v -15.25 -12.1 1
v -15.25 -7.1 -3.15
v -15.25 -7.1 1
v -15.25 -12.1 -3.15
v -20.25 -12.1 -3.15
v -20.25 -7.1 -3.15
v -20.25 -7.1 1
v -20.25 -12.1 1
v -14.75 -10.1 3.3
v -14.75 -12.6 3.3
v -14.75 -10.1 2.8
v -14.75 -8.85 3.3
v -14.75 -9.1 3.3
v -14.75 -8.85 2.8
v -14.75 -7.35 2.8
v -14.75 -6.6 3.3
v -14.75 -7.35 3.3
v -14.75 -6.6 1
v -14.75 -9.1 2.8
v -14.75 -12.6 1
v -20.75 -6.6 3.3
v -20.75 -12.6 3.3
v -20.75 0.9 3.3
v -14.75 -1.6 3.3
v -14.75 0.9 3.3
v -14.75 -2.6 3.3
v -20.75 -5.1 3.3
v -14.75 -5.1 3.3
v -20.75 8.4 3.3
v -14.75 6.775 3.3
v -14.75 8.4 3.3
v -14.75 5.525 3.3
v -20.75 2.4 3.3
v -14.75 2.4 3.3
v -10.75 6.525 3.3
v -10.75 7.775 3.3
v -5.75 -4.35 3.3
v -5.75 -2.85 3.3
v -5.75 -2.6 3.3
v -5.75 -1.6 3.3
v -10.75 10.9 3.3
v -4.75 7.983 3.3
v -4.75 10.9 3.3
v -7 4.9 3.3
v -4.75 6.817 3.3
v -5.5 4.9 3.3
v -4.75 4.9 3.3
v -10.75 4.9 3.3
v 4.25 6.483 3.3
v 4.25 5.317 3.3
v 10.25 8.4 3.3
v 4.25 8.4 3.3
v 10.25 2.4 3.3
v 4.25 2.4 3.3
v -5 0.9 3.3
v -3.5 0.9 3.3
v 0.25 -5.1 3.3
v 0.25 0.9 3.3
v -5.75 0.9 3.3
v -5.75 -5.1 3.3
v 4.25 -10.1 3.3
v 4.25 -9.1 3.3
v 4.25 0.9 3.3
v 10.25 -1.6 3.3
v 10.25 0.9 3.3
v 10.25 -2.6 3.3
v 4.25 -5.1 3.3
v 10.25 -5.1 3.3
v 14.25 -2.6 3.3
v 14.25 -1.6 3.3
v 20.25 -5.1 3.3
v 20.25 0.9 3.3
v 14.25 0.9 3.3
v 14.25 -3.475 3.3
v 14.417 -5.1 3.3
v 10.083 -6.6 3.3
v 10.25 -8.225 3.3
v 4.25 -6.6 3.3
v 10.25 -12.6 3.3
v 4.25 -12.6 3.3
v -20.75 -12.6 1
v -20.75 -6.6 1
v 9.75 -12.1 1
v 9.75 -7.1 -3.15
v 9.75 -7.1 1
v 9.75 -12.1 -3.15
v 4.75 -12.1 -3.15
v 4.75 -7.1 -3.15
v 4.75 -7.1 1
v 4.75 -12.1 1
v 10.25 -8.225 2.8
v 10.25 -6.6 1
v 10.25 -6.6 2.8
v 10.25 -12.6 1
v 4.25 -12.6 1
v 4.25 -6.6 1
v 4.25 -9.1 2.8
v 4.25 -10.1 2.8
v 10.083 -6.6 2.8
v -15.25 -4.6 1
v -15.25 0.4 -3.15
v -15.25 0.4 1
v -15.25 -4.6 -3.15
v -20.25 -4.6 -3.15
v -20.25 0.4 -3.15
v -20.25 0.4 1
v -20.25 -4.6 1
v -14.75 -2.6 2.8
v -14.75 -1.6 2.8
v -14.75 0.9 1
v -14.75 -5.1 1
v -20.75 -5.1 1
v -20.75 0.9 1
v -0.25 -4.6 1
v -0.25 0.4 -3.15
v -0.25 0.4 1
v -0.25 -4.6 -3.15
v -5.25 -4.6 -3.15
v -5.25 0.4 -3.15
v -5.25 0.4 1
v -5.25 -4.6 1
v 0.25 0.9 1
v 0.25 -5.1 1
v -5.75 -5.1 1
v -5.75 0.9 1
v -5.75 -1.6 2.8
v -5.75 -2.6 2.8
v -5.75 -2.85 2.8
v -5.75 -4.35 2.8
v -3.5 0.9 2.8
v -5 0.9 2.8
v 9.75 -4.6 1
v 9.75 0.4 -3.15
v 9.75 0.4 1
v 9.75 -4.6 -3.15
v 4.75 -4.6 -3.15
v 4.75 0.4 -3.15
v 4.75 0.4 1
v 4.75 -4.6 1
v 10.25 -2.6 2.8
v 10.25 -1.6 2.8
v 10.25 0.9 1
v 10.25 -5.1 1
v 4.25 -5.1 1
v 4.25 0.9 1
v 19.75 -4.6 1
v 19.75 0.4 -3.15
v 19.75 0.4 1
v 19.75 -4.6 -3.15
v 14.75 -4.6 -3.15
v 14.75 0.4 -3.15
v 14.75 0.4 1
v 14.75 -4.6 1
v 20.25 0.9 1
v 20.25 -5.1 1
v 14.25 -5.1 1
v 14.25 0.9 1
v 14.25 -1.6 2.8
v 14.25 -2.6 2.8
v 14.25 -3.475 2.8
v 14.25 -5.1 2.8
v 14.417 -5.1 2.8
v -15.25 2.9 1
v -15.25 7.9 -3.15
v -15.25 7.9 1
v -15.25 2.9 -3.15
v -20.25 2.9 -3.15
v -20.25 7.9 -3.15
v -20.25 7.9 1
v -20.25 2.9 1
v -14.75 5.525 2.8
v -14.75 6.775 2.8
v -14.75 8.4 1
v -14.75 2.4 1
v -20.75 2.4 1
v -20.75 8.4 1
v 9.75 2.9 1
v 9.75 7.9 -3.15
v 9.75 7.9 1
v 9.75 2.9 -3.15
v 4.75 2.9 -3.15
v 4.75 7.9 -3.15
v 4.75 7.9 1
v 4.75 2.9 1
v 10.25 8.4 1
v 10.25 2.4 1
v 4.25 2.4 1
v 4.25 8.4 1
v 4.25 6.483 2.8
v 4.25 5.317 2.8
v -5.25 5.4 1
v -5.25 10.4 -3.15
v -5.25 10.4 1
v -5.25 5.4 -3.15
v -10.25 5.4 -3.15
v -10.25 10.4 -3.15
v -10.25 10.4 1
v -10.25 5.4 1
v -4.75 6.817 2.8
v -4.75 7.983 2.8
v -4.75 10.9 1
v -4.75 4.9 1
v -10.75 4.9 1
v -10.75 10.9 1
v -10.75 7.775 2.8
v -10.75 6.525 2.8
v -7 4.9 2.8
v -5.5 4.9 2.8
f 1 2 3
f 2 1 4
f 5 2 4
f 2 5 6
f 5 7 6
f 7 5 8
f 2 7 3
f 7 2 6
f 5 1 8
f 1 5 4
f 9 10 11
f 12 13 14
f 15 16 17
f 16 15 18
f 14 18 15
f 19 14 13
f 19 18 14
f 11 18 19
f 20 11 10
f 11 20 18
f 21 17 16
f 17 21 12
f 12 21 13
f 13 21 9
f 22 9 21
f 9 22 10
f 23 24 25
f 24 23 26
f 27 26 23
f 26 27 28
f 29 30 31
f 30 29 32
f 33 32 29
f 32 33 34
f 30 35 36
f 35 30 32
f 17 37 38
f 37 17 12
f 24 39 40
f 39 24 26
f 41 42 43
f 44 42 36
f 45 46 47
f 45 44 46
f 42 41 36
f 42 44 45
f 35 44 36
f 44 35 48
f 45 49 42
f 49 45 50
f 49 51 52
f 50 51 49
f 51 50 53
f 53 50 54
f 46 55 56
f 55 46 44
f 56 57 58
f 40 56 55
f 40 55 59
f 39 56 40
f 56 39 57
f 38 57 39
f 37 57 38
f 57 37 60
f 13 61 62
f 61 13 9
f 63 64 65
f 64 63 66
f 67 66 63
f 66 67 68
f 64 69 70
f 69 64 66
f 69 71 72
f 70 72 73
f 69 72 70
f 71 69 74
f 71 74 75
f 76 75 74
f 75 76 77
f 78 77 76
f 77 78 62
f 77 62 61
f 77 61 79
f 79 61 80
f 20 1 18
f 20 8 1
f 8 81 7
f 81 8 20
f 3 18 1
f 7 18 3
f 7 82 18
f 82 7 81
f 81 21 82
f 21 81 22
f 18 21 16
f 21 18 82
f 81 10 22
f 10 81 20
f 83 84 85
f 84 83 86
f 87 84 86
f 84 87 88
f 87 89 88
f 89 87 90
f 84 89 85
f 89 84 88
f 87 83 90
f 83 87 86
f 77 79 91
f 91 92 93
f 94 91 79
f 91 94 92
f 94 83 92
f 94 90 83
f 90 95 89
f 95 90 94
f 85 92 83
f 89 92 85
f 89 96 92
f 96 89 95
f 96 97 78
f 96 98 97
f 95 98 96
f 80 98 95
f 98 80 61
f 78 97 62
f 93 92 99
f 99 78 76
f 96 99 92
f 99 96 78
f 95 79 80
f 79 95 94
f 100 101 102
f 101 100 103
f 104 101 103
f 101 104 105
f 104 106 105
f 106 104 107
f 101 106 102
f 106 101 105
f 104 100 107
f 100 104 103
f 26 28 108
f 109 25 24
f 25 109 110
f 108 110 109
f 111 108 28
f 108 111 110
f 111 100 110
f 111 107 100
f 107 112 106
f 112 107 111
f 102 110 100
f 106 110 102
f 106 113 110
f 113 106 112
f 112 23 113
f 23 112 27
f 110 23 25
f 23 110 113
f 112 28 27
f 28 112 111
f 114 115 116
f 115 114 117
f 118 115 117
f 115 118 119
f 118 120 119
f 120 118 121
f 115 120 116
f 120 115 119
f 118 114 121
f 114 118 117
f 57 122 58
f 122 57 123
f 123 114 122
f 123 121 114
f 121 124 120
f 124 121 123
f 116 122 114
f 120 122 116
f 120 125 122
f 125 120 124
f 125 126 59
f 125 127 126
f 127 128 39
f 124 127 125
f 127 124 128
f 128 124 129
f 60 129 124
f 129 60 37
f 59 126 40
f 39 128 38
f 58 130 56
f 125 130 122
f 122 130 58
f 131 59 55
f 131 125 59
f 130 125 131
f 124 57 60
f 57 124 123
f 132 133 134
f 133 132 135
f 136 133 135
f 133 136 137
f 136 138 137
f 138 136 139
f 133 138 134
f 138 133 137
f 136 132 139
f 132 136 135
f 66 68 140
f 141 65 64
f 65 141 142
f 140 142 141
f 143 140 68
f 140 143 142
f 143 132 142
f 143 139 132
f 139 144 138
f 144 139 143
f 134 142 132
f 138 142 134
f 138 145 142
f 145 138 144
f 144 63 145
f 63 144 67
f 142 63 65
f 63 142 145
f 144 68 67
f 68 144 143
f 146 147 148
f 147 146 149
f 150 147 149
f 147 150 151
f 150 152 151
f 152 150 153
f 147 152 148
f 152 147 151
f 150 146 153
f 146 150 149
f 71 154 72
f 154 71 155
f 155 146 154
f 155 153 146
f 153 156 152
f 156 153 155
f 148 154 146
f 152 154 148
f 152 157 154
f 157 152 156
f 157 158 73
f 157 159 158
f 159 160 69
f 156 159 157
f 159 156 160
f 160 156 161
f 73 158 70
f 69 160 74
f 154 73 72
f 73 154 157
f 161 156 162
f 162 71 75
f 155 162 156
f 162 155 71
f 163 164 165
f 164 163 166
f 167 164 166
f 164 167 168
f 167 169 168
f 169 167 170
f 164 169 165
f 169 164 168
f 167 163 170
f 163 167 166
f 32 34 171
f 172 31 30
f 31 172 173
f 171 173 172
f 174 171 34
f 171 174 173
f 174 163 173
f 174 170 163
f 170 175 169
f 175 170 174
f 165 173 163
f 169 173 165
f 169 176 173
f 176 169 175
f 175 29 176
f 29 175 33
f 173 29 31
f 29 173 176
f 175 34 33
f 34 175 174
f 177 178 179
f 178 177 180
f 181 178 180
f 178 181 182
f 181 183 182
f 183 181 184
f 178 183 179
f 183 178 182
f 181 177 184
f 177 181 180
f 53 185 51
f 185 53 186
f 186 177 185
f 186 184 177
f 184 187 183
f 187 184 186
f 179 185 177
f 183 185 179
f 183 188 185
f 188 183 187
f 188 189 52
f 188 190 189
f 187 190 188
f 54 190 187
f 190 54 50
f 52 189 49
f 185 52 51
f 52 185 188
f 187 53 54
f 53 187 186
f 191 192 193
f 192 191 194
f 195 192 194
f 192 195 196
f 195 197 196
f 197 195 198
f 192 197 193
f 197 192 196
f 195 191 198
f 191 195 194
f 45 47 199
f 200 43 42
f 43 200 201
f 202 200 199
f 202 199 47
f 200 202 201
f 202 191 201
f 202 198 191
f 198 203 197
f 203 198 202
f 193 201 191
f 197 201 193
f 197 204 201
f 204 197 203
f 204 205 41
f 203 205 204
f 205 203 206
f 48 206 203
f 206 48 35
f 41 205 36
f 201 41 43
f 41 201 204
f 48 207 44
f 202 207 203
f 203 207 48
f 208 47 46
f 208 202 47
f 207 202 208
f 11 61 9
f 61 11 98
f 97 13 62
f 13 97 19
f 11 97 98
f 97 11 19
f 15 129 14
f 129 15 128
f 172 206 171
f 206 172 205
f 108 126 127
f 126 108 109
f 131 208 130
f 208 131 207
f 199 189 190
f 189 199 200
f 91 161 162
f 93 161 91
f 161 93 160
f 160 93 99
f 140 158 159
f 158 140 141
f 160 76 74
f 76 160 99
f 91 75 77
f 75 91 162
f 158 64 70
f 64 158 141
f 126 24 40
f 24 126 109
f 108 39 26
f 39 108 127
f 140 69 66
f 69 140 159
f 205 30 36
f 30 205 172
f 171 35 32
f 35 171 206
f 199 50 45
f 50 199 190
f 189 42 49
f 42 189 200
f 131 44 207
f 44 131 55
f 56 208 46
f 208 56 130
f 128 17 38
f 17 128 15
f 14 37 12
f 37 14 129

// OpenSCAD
$fn=30;

hole_d = 2.8;
hole_d_through = 3.5;
wall = 2;
gap = 0.3;
pcb_hole_dist = 2.5;
pcb_double_sz_z = 1.5;
btn_sz_x = pcb_hole_dist * 3;
btn_sz_y = pcb_hole_dist * 2;
btn_sz_z = 5.2;
btn_pressed_sz_z = 4;
inter_btn_space = pcb_hole_dist;
btn_space_z = btn_sz_z + 2*wall;
presser_above_wall = 2;
button_link_sz_z = 0.5;

module button_presser() {
		cube([5, 5, gap+2*wall+presser_above_wall], center=true);
		translate([0, 0, (gap+wall+presser_above_wall)/2]) {
			cube([6, 6, gap+wall], center=true);
		}
}

module button_presser_hole() {
	cube([5+2*gap, 5+2*gap, wall], center=true);
}

// map of button center coordinates in pcb holes from left top corner
// zero based
module button_set(btn_coordinates=[], button_presser_mode=false, btn_links=[]) {
	translate([pcb_hole_off_x-pcb_sz_x/2, pcb_hole_off_y-pcb_sz_y/2, 0]) {
		for(i=[0:len(btn_coordinates)-1]) {
			p = btn_coordinates[i];
			translate([pcb_hole_dist*p[0], pcb_hole_dist*p[1], 0]) {
				if(button_presser_mode) {
					button_presser();
				} else {
					button_presser_hole();
				}
			}
		}
		if(button_presser_mode) {
			for(lnk=btn_links) {
				translate([0, 0, (2*gap+2*wall+presser_above_wall-button_link_sz_z)/2]) {
					hull() {
						p1 = btn_coordinates[lnk[0]];
						p2 = btn_coordinates[lnk[1]];
						translate([pcb_hole_dist*p1[0], pcb_hole_dist*p1[1], 0]) {
							cube([1, 1, button_link_sz_z], center=true);
							translate([pcb_hole_dist*(p2[0]-p1[0]), pcb_hole_dist*(p2[1]-p1[1]), 0]) {
								cube([1, 1, button_link_sz_z], center=true);
							}
						}
					}
				}
			}
		}
	}
}

button_set1 = [
				[1.5, 1],          [11.5, 1],
				[1.5, 4], [7.5, 4], [11.5, 4], [15.5, 4],
				[1.5, 7],          [11.5, 7],
					   [5.5, 8],
];

btn_links1 = [
	[0, 1], [1, 5],
	[2, 3], [4, 5],
	[6, 8], [8, 7],
  [3, 8], [0, 3],
];

pcb_sz_x = 50;
pcb_sz_y = 36.2;
pcb_hole_off_x = 3.5;
pcb_hole_off_y = 6;
pcb_side_free_space = 3;
side_gap = 5;
button_top_sz_x = pcb_sz_x+2*side_gap+2*gap+wall;
button_top_sz_y = pcb_sz_y+2*side_gap+2*gap+wall;
button_top_sz_z = wall+btn_space_z + pcb_double_sz_z;

module buttons_case() {
	difference() {
		union() {
			cube([button_top_sz_x, button_top_sz_y, wall], center=true);
			for(xsgn=[-1, 1]) {
				translate([xsgn*(button_top_sz_x-wall)/2, 0, (button_top_sz_z-wall)/2]) {
					cube([wall, button_top_sz_y, button_top_sz_z], center=true);
				}
			}
			for(ysgn=[-1, 1]) {
				translate([0, ysgn*(button_top_sz_y-wall)/2, (button_top_sz_z-wall)/2]) {
					cube([button_top_sz_x, wall, button_top_sz_z], center=true);
					// corners
					for(xsgn=[-1,1]) {
						translate([xsgn*(button_top_sz_x-wall-side_gap)/2, ysgn*-side_gap/2, 0]) {
							translate([0, ysgn*-wall, 0]) {
								cube([side_gap, side_gap+wall, button_top_sz_z], center=true);
							}
							translate([xsgn*-wall, 0, 0]) {
								cube([side_gap+wall, side_gap, button_top_sz_z], center=true);
							}
							hull() {
								cube([side_gap, side_gap, btn_space_z], center=true);
								translate([xsgn*(-side_gap-pcb_side_free_space)/2, ysgn*(-side_gap-pcb_side_free_space)/2, 0]) {
									cube([pcb_side_free_space, pcb_side_free_space, btn_space_z], center=true);
								}
							}
						}
					}
				}
			}
		}
		for(ysgn=[-1, 1]) {
			for(xsgn=[-1,1]) {
				translate([xsgn*(button_top_sz_x-wall-side_gap)/2, ysgn*(button_top_sz_y-wall-side_gap)/2, (button_top_sz_z-wall)/2]) {
					cylinder(d=hole_d_through, h=20, center=true);
				}
			}
		}
		button_set(button_set1);
	}
}

module pcb_cover() {
	difference() {
		cube([button_top_sz_x, button_top_sz_y, wall], center=true);
		cube([button_top_sz_x-2*wall-2*side_gap-2*pcb_side_free_space, button_top_sz_y-2*wall-2*side_gap-2*pcb_side_free_space, wall], center=true);
		for(ysgn=[-1, 1]) {
			for(xsgn=[-1,1]) {
				translate([xsgn*(button_top_sz_x-wall-side_gap)/2, ysgn*(button_top_sz_y-wall-side_gap)/2, (button_top_sz_z-wall)/2]) {
					cylinder(d=hole_d_through, h=20, center=true);
				}
			}
		}
	}
}

undercase_sz_z = 18;
attachment_width = 10;
attachment_external_length = 5;

module undercase() {
	difference() {
		union() {
			cube([button_top_sz_x, button_top_sz_y, wall], center=true);
			for(xsgn=[-1, 1]) {
				// wall along y
				translate([xsgn*(button_top_sz_x-wall)/2, 0, (undercase_sz_z-wall)/2]) {
					cube([wall, button_top_sz_y, undercase_sz_z], center=true);
				}
			}
			// attachment
			difference() {
				union() {
					cube([button_top_sz_x+2*wall+attachment_external_length, attachment_width, wall], center=true);
					for(xsgn=[-1, 1]) {
						translate([xsgn*(button_top_sz_x/2+wall+attachment_external_length/2), 0, 0]) {
							cylinder(d=attachment_width, h=wall, center=true);
						}
					}
				}
				for(xsgn=[-1, 1]) {
					translate([xsgn*(button_top_sz_x/2+wall+attachment_external_length/2), 0, 0]) {
						cylinder(d=hole_d_through, h=wall, center=true);
					}
				}
			}
			for(ysgn=[-1, 1]) {
				translate([0, ysgn*(button_top_sz_y-wall)/2, (undercase_sz_z-wall)/2]) {
					// wall along x
					cube([button_top_sz_x, wall, undercase_sz_z], center=true);
					// corners
					for(xsgn=[-1,1]) {
						translate([xsgn*(button_top_sz_x-wall-side_gap)/2, ysgn*-side_gap/2, 0]) {
							translate([0, 0, 0]) {
								cube([side_gap, side_gap, undercase_sz_z], center=true);
							}
						}
					}
				}
			}
		}
		for(ysgn=[-1, 1]) {
			for(xsgn=[-1,1]) {
				translate([xsgn*(button_top_sz_x-wall-side_gap)/2, ysgn*(button_top_sz_y-wall-side_gap)/2, (undercase_sz_z-wall)/2]) {
					cylinder(d=hole_d, h=undercase_sz_z, center=true);
				}
			}
		}
		// hole for wires
		translate([button_top_sz_x/2, 0, undercase_sz_z-3.5]) {
			cube([10, 10, 7], center=true);
		}
	}
}

translate([0, 0, undercase_sz_z+button_top_sz_z-wall]) {
	rotate([180, 0, 0]) {
		//buttons_case();
	}
}
//undercase();

//button_presser();
button_set(button_set1, button_presser_mode=true, btn_links=btn_links1);
translate([0, 0, button_top_sz_z]) {
	//pcb_cover();
}
